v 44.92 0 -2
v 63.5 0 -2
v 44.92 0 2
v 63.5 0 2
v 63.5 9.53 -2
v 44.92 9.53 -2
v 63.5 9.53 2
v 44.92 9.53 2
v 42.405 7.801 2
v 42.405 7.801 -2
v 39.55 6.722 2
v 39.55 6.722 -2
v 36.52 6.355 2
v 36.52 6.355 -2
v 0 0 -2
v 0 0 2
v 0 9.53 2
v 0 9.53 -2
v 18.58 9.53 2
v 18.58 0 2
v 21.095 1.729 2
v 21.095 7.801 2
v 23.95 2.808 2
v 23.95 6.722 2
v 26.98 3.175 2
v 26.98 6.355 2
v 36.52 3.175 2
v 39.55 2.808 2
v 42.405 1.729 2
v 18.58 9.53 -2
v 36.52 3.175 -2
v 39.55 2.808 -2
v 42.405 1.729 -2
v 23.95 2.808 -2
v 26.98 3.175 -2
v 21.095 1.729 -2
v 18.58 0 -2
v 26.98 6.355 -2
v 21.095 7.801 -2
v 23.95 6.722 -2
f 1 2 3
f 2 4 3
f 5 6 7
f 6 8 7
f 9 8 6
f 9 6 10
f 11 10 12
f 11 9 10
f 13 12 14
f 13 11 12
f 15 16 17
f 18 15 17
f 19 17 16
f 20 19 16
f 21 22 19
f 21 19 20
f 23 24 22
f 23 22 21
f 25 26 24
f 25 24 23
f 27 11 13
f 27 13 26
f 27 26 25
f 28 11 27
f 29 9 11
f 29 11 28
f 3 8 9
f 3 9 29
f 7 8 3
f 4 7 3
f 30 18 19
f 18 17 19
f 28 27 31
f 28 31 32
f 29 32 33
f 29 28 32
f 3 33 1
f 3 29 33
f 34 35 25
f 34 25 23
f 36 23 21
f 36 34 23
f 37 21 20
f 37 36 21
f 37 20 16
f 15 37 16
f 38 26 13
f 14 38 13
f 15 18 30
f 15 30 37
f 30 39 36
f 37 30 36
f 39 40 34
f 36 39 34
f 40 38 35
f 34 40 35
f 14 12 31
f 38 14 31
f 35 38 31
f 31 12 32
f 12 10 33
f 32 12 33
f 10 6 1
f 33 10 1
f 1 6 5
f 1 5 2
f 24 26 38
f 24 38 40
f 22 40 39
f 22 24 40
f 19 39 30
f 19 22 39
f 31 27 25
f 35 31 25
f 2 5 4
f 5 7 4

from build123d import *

# Parameters (mm, degrees)
BOSS_EXTRUDE1_DEPTH = 2
FILLET1_R           = 12.7
FILLET2_R           = 12.7


with BuildPart() as part:
    # Sketch1 → Boss-Extrude1 (new, symmetric)
    with BuildSketch(Plane.XY):
        Polygon((0, 0), (0, 9.53), (18.58, 9.53), (18.58, 6.355), (44.92, 6.355), (44.92, 9.53), (63.5, 9.53), (63.5, 0), (44.92, 0), (44.92, 3.175), (18.58, 3.175), (18.58, 0), align=None)
    extrude(amount=BOSS_EXTRUDE1_DEPTH, both=True)

    # Fillet1
    # the kernel refuses this fillet: 12.7 mm, written as the material it adds along each edge
    with BuildSketch(Plane(origin=(44.92, 3.175, 2), x_dir=(-1, 0, 0), z_dir=(0, 0, -1))) as fillet1_piece_1:
        with BuildLine():
            CenterArc((8.400260413, -12.7), FILLET1_R, 90, 41.409622109)
            Line((0, -3.175), (-0.168005208, -2.9845))
            ThreePointArc((-0.168005208, -2.9845), (-0.254, -1.5875), (-0.254, 0))
            Line((-0.254, 0), (0, 0.254))
            Line((0, 0.254), (8.400260413, 0.254))
            Line((8.400260413, 0.254), (8.400260413, 0))
        make_face()
    extrude(amount=4)
    with BuildSketch(Plane(origin=(18.58, 3.175, -2), x_dir=(0, -1, 0), z_dir=(0, 0, 1))) as fillet1_piece_2:
        with BuildLine():
            CenterArc((12.7, 8.400260413), FILLET1_R, 180, 41.409622109)
            Line((0, 8.400260413), (-0.254, 8.400260413))
            Line((-0.254, 8.400260413), (-0.254, 0))
            Line((-0.254, 0), (0, -0.254))
            ThreePointArc((0, -0.254), (1.5875, -0.254), (2.9845, -0.168005208))
            Line((2.9845, -0.168005208), (3.175, 0))
        make_face()
    extrude(amount=4)

    # Fillet2
    # the kernel refuses this fillet: 12.7 mm, written as the material it adds along each edge
    with BuildSketch(Plane(origin=(44.92, 6.355, 2), x_dir=(-1, 0, 0), z_dir=(0, 0, -1))) as fillet2_piece_1:
        with BuildLine():
            CenterArc((8.400260413, 12.7), FILLET2_R, 228.590377891, 41.409622109)
            Line((0, 3.175), (-0.168005208, 2.9845))
            ThreePointArc((-0.168005208, 2.9845), (-0.254, 1.5875), (-0.254, 0))
            Line((-0.254, 0), (0, -0.254))
            Line((0, -0.254), (8.400260413, -0.254))
            Line((8.400260413, -0.254), (8.400260413, 0))
        make_face()
    extrude(amount=4)
    with BuildSketch(Plane(origin=(18.58, 6.355, 2), x_dir=(0, 1, 0), z_dir=(0, 0, -1))) as fillet2_piece_2:
        with BuildLine():
            CenterArc((12.7, 8.400260413), FILLET2_R, 180, 41.409622109)
            Line((0, 8.400260413), (-0.254, 8.400260413))
            Line((-0.254, 8.400260413), (-0.254, 0))
            Line((-0.254, 0), (0, -0.254))
            ThreePointArc((0, -0.254), (1.5875, -0.254), (2.9845, -0.168005208))
            Line((2.9845, -0.168005208), (3.175, 0))
        make_face()
    extrude(amount=4)


solid = part.part
